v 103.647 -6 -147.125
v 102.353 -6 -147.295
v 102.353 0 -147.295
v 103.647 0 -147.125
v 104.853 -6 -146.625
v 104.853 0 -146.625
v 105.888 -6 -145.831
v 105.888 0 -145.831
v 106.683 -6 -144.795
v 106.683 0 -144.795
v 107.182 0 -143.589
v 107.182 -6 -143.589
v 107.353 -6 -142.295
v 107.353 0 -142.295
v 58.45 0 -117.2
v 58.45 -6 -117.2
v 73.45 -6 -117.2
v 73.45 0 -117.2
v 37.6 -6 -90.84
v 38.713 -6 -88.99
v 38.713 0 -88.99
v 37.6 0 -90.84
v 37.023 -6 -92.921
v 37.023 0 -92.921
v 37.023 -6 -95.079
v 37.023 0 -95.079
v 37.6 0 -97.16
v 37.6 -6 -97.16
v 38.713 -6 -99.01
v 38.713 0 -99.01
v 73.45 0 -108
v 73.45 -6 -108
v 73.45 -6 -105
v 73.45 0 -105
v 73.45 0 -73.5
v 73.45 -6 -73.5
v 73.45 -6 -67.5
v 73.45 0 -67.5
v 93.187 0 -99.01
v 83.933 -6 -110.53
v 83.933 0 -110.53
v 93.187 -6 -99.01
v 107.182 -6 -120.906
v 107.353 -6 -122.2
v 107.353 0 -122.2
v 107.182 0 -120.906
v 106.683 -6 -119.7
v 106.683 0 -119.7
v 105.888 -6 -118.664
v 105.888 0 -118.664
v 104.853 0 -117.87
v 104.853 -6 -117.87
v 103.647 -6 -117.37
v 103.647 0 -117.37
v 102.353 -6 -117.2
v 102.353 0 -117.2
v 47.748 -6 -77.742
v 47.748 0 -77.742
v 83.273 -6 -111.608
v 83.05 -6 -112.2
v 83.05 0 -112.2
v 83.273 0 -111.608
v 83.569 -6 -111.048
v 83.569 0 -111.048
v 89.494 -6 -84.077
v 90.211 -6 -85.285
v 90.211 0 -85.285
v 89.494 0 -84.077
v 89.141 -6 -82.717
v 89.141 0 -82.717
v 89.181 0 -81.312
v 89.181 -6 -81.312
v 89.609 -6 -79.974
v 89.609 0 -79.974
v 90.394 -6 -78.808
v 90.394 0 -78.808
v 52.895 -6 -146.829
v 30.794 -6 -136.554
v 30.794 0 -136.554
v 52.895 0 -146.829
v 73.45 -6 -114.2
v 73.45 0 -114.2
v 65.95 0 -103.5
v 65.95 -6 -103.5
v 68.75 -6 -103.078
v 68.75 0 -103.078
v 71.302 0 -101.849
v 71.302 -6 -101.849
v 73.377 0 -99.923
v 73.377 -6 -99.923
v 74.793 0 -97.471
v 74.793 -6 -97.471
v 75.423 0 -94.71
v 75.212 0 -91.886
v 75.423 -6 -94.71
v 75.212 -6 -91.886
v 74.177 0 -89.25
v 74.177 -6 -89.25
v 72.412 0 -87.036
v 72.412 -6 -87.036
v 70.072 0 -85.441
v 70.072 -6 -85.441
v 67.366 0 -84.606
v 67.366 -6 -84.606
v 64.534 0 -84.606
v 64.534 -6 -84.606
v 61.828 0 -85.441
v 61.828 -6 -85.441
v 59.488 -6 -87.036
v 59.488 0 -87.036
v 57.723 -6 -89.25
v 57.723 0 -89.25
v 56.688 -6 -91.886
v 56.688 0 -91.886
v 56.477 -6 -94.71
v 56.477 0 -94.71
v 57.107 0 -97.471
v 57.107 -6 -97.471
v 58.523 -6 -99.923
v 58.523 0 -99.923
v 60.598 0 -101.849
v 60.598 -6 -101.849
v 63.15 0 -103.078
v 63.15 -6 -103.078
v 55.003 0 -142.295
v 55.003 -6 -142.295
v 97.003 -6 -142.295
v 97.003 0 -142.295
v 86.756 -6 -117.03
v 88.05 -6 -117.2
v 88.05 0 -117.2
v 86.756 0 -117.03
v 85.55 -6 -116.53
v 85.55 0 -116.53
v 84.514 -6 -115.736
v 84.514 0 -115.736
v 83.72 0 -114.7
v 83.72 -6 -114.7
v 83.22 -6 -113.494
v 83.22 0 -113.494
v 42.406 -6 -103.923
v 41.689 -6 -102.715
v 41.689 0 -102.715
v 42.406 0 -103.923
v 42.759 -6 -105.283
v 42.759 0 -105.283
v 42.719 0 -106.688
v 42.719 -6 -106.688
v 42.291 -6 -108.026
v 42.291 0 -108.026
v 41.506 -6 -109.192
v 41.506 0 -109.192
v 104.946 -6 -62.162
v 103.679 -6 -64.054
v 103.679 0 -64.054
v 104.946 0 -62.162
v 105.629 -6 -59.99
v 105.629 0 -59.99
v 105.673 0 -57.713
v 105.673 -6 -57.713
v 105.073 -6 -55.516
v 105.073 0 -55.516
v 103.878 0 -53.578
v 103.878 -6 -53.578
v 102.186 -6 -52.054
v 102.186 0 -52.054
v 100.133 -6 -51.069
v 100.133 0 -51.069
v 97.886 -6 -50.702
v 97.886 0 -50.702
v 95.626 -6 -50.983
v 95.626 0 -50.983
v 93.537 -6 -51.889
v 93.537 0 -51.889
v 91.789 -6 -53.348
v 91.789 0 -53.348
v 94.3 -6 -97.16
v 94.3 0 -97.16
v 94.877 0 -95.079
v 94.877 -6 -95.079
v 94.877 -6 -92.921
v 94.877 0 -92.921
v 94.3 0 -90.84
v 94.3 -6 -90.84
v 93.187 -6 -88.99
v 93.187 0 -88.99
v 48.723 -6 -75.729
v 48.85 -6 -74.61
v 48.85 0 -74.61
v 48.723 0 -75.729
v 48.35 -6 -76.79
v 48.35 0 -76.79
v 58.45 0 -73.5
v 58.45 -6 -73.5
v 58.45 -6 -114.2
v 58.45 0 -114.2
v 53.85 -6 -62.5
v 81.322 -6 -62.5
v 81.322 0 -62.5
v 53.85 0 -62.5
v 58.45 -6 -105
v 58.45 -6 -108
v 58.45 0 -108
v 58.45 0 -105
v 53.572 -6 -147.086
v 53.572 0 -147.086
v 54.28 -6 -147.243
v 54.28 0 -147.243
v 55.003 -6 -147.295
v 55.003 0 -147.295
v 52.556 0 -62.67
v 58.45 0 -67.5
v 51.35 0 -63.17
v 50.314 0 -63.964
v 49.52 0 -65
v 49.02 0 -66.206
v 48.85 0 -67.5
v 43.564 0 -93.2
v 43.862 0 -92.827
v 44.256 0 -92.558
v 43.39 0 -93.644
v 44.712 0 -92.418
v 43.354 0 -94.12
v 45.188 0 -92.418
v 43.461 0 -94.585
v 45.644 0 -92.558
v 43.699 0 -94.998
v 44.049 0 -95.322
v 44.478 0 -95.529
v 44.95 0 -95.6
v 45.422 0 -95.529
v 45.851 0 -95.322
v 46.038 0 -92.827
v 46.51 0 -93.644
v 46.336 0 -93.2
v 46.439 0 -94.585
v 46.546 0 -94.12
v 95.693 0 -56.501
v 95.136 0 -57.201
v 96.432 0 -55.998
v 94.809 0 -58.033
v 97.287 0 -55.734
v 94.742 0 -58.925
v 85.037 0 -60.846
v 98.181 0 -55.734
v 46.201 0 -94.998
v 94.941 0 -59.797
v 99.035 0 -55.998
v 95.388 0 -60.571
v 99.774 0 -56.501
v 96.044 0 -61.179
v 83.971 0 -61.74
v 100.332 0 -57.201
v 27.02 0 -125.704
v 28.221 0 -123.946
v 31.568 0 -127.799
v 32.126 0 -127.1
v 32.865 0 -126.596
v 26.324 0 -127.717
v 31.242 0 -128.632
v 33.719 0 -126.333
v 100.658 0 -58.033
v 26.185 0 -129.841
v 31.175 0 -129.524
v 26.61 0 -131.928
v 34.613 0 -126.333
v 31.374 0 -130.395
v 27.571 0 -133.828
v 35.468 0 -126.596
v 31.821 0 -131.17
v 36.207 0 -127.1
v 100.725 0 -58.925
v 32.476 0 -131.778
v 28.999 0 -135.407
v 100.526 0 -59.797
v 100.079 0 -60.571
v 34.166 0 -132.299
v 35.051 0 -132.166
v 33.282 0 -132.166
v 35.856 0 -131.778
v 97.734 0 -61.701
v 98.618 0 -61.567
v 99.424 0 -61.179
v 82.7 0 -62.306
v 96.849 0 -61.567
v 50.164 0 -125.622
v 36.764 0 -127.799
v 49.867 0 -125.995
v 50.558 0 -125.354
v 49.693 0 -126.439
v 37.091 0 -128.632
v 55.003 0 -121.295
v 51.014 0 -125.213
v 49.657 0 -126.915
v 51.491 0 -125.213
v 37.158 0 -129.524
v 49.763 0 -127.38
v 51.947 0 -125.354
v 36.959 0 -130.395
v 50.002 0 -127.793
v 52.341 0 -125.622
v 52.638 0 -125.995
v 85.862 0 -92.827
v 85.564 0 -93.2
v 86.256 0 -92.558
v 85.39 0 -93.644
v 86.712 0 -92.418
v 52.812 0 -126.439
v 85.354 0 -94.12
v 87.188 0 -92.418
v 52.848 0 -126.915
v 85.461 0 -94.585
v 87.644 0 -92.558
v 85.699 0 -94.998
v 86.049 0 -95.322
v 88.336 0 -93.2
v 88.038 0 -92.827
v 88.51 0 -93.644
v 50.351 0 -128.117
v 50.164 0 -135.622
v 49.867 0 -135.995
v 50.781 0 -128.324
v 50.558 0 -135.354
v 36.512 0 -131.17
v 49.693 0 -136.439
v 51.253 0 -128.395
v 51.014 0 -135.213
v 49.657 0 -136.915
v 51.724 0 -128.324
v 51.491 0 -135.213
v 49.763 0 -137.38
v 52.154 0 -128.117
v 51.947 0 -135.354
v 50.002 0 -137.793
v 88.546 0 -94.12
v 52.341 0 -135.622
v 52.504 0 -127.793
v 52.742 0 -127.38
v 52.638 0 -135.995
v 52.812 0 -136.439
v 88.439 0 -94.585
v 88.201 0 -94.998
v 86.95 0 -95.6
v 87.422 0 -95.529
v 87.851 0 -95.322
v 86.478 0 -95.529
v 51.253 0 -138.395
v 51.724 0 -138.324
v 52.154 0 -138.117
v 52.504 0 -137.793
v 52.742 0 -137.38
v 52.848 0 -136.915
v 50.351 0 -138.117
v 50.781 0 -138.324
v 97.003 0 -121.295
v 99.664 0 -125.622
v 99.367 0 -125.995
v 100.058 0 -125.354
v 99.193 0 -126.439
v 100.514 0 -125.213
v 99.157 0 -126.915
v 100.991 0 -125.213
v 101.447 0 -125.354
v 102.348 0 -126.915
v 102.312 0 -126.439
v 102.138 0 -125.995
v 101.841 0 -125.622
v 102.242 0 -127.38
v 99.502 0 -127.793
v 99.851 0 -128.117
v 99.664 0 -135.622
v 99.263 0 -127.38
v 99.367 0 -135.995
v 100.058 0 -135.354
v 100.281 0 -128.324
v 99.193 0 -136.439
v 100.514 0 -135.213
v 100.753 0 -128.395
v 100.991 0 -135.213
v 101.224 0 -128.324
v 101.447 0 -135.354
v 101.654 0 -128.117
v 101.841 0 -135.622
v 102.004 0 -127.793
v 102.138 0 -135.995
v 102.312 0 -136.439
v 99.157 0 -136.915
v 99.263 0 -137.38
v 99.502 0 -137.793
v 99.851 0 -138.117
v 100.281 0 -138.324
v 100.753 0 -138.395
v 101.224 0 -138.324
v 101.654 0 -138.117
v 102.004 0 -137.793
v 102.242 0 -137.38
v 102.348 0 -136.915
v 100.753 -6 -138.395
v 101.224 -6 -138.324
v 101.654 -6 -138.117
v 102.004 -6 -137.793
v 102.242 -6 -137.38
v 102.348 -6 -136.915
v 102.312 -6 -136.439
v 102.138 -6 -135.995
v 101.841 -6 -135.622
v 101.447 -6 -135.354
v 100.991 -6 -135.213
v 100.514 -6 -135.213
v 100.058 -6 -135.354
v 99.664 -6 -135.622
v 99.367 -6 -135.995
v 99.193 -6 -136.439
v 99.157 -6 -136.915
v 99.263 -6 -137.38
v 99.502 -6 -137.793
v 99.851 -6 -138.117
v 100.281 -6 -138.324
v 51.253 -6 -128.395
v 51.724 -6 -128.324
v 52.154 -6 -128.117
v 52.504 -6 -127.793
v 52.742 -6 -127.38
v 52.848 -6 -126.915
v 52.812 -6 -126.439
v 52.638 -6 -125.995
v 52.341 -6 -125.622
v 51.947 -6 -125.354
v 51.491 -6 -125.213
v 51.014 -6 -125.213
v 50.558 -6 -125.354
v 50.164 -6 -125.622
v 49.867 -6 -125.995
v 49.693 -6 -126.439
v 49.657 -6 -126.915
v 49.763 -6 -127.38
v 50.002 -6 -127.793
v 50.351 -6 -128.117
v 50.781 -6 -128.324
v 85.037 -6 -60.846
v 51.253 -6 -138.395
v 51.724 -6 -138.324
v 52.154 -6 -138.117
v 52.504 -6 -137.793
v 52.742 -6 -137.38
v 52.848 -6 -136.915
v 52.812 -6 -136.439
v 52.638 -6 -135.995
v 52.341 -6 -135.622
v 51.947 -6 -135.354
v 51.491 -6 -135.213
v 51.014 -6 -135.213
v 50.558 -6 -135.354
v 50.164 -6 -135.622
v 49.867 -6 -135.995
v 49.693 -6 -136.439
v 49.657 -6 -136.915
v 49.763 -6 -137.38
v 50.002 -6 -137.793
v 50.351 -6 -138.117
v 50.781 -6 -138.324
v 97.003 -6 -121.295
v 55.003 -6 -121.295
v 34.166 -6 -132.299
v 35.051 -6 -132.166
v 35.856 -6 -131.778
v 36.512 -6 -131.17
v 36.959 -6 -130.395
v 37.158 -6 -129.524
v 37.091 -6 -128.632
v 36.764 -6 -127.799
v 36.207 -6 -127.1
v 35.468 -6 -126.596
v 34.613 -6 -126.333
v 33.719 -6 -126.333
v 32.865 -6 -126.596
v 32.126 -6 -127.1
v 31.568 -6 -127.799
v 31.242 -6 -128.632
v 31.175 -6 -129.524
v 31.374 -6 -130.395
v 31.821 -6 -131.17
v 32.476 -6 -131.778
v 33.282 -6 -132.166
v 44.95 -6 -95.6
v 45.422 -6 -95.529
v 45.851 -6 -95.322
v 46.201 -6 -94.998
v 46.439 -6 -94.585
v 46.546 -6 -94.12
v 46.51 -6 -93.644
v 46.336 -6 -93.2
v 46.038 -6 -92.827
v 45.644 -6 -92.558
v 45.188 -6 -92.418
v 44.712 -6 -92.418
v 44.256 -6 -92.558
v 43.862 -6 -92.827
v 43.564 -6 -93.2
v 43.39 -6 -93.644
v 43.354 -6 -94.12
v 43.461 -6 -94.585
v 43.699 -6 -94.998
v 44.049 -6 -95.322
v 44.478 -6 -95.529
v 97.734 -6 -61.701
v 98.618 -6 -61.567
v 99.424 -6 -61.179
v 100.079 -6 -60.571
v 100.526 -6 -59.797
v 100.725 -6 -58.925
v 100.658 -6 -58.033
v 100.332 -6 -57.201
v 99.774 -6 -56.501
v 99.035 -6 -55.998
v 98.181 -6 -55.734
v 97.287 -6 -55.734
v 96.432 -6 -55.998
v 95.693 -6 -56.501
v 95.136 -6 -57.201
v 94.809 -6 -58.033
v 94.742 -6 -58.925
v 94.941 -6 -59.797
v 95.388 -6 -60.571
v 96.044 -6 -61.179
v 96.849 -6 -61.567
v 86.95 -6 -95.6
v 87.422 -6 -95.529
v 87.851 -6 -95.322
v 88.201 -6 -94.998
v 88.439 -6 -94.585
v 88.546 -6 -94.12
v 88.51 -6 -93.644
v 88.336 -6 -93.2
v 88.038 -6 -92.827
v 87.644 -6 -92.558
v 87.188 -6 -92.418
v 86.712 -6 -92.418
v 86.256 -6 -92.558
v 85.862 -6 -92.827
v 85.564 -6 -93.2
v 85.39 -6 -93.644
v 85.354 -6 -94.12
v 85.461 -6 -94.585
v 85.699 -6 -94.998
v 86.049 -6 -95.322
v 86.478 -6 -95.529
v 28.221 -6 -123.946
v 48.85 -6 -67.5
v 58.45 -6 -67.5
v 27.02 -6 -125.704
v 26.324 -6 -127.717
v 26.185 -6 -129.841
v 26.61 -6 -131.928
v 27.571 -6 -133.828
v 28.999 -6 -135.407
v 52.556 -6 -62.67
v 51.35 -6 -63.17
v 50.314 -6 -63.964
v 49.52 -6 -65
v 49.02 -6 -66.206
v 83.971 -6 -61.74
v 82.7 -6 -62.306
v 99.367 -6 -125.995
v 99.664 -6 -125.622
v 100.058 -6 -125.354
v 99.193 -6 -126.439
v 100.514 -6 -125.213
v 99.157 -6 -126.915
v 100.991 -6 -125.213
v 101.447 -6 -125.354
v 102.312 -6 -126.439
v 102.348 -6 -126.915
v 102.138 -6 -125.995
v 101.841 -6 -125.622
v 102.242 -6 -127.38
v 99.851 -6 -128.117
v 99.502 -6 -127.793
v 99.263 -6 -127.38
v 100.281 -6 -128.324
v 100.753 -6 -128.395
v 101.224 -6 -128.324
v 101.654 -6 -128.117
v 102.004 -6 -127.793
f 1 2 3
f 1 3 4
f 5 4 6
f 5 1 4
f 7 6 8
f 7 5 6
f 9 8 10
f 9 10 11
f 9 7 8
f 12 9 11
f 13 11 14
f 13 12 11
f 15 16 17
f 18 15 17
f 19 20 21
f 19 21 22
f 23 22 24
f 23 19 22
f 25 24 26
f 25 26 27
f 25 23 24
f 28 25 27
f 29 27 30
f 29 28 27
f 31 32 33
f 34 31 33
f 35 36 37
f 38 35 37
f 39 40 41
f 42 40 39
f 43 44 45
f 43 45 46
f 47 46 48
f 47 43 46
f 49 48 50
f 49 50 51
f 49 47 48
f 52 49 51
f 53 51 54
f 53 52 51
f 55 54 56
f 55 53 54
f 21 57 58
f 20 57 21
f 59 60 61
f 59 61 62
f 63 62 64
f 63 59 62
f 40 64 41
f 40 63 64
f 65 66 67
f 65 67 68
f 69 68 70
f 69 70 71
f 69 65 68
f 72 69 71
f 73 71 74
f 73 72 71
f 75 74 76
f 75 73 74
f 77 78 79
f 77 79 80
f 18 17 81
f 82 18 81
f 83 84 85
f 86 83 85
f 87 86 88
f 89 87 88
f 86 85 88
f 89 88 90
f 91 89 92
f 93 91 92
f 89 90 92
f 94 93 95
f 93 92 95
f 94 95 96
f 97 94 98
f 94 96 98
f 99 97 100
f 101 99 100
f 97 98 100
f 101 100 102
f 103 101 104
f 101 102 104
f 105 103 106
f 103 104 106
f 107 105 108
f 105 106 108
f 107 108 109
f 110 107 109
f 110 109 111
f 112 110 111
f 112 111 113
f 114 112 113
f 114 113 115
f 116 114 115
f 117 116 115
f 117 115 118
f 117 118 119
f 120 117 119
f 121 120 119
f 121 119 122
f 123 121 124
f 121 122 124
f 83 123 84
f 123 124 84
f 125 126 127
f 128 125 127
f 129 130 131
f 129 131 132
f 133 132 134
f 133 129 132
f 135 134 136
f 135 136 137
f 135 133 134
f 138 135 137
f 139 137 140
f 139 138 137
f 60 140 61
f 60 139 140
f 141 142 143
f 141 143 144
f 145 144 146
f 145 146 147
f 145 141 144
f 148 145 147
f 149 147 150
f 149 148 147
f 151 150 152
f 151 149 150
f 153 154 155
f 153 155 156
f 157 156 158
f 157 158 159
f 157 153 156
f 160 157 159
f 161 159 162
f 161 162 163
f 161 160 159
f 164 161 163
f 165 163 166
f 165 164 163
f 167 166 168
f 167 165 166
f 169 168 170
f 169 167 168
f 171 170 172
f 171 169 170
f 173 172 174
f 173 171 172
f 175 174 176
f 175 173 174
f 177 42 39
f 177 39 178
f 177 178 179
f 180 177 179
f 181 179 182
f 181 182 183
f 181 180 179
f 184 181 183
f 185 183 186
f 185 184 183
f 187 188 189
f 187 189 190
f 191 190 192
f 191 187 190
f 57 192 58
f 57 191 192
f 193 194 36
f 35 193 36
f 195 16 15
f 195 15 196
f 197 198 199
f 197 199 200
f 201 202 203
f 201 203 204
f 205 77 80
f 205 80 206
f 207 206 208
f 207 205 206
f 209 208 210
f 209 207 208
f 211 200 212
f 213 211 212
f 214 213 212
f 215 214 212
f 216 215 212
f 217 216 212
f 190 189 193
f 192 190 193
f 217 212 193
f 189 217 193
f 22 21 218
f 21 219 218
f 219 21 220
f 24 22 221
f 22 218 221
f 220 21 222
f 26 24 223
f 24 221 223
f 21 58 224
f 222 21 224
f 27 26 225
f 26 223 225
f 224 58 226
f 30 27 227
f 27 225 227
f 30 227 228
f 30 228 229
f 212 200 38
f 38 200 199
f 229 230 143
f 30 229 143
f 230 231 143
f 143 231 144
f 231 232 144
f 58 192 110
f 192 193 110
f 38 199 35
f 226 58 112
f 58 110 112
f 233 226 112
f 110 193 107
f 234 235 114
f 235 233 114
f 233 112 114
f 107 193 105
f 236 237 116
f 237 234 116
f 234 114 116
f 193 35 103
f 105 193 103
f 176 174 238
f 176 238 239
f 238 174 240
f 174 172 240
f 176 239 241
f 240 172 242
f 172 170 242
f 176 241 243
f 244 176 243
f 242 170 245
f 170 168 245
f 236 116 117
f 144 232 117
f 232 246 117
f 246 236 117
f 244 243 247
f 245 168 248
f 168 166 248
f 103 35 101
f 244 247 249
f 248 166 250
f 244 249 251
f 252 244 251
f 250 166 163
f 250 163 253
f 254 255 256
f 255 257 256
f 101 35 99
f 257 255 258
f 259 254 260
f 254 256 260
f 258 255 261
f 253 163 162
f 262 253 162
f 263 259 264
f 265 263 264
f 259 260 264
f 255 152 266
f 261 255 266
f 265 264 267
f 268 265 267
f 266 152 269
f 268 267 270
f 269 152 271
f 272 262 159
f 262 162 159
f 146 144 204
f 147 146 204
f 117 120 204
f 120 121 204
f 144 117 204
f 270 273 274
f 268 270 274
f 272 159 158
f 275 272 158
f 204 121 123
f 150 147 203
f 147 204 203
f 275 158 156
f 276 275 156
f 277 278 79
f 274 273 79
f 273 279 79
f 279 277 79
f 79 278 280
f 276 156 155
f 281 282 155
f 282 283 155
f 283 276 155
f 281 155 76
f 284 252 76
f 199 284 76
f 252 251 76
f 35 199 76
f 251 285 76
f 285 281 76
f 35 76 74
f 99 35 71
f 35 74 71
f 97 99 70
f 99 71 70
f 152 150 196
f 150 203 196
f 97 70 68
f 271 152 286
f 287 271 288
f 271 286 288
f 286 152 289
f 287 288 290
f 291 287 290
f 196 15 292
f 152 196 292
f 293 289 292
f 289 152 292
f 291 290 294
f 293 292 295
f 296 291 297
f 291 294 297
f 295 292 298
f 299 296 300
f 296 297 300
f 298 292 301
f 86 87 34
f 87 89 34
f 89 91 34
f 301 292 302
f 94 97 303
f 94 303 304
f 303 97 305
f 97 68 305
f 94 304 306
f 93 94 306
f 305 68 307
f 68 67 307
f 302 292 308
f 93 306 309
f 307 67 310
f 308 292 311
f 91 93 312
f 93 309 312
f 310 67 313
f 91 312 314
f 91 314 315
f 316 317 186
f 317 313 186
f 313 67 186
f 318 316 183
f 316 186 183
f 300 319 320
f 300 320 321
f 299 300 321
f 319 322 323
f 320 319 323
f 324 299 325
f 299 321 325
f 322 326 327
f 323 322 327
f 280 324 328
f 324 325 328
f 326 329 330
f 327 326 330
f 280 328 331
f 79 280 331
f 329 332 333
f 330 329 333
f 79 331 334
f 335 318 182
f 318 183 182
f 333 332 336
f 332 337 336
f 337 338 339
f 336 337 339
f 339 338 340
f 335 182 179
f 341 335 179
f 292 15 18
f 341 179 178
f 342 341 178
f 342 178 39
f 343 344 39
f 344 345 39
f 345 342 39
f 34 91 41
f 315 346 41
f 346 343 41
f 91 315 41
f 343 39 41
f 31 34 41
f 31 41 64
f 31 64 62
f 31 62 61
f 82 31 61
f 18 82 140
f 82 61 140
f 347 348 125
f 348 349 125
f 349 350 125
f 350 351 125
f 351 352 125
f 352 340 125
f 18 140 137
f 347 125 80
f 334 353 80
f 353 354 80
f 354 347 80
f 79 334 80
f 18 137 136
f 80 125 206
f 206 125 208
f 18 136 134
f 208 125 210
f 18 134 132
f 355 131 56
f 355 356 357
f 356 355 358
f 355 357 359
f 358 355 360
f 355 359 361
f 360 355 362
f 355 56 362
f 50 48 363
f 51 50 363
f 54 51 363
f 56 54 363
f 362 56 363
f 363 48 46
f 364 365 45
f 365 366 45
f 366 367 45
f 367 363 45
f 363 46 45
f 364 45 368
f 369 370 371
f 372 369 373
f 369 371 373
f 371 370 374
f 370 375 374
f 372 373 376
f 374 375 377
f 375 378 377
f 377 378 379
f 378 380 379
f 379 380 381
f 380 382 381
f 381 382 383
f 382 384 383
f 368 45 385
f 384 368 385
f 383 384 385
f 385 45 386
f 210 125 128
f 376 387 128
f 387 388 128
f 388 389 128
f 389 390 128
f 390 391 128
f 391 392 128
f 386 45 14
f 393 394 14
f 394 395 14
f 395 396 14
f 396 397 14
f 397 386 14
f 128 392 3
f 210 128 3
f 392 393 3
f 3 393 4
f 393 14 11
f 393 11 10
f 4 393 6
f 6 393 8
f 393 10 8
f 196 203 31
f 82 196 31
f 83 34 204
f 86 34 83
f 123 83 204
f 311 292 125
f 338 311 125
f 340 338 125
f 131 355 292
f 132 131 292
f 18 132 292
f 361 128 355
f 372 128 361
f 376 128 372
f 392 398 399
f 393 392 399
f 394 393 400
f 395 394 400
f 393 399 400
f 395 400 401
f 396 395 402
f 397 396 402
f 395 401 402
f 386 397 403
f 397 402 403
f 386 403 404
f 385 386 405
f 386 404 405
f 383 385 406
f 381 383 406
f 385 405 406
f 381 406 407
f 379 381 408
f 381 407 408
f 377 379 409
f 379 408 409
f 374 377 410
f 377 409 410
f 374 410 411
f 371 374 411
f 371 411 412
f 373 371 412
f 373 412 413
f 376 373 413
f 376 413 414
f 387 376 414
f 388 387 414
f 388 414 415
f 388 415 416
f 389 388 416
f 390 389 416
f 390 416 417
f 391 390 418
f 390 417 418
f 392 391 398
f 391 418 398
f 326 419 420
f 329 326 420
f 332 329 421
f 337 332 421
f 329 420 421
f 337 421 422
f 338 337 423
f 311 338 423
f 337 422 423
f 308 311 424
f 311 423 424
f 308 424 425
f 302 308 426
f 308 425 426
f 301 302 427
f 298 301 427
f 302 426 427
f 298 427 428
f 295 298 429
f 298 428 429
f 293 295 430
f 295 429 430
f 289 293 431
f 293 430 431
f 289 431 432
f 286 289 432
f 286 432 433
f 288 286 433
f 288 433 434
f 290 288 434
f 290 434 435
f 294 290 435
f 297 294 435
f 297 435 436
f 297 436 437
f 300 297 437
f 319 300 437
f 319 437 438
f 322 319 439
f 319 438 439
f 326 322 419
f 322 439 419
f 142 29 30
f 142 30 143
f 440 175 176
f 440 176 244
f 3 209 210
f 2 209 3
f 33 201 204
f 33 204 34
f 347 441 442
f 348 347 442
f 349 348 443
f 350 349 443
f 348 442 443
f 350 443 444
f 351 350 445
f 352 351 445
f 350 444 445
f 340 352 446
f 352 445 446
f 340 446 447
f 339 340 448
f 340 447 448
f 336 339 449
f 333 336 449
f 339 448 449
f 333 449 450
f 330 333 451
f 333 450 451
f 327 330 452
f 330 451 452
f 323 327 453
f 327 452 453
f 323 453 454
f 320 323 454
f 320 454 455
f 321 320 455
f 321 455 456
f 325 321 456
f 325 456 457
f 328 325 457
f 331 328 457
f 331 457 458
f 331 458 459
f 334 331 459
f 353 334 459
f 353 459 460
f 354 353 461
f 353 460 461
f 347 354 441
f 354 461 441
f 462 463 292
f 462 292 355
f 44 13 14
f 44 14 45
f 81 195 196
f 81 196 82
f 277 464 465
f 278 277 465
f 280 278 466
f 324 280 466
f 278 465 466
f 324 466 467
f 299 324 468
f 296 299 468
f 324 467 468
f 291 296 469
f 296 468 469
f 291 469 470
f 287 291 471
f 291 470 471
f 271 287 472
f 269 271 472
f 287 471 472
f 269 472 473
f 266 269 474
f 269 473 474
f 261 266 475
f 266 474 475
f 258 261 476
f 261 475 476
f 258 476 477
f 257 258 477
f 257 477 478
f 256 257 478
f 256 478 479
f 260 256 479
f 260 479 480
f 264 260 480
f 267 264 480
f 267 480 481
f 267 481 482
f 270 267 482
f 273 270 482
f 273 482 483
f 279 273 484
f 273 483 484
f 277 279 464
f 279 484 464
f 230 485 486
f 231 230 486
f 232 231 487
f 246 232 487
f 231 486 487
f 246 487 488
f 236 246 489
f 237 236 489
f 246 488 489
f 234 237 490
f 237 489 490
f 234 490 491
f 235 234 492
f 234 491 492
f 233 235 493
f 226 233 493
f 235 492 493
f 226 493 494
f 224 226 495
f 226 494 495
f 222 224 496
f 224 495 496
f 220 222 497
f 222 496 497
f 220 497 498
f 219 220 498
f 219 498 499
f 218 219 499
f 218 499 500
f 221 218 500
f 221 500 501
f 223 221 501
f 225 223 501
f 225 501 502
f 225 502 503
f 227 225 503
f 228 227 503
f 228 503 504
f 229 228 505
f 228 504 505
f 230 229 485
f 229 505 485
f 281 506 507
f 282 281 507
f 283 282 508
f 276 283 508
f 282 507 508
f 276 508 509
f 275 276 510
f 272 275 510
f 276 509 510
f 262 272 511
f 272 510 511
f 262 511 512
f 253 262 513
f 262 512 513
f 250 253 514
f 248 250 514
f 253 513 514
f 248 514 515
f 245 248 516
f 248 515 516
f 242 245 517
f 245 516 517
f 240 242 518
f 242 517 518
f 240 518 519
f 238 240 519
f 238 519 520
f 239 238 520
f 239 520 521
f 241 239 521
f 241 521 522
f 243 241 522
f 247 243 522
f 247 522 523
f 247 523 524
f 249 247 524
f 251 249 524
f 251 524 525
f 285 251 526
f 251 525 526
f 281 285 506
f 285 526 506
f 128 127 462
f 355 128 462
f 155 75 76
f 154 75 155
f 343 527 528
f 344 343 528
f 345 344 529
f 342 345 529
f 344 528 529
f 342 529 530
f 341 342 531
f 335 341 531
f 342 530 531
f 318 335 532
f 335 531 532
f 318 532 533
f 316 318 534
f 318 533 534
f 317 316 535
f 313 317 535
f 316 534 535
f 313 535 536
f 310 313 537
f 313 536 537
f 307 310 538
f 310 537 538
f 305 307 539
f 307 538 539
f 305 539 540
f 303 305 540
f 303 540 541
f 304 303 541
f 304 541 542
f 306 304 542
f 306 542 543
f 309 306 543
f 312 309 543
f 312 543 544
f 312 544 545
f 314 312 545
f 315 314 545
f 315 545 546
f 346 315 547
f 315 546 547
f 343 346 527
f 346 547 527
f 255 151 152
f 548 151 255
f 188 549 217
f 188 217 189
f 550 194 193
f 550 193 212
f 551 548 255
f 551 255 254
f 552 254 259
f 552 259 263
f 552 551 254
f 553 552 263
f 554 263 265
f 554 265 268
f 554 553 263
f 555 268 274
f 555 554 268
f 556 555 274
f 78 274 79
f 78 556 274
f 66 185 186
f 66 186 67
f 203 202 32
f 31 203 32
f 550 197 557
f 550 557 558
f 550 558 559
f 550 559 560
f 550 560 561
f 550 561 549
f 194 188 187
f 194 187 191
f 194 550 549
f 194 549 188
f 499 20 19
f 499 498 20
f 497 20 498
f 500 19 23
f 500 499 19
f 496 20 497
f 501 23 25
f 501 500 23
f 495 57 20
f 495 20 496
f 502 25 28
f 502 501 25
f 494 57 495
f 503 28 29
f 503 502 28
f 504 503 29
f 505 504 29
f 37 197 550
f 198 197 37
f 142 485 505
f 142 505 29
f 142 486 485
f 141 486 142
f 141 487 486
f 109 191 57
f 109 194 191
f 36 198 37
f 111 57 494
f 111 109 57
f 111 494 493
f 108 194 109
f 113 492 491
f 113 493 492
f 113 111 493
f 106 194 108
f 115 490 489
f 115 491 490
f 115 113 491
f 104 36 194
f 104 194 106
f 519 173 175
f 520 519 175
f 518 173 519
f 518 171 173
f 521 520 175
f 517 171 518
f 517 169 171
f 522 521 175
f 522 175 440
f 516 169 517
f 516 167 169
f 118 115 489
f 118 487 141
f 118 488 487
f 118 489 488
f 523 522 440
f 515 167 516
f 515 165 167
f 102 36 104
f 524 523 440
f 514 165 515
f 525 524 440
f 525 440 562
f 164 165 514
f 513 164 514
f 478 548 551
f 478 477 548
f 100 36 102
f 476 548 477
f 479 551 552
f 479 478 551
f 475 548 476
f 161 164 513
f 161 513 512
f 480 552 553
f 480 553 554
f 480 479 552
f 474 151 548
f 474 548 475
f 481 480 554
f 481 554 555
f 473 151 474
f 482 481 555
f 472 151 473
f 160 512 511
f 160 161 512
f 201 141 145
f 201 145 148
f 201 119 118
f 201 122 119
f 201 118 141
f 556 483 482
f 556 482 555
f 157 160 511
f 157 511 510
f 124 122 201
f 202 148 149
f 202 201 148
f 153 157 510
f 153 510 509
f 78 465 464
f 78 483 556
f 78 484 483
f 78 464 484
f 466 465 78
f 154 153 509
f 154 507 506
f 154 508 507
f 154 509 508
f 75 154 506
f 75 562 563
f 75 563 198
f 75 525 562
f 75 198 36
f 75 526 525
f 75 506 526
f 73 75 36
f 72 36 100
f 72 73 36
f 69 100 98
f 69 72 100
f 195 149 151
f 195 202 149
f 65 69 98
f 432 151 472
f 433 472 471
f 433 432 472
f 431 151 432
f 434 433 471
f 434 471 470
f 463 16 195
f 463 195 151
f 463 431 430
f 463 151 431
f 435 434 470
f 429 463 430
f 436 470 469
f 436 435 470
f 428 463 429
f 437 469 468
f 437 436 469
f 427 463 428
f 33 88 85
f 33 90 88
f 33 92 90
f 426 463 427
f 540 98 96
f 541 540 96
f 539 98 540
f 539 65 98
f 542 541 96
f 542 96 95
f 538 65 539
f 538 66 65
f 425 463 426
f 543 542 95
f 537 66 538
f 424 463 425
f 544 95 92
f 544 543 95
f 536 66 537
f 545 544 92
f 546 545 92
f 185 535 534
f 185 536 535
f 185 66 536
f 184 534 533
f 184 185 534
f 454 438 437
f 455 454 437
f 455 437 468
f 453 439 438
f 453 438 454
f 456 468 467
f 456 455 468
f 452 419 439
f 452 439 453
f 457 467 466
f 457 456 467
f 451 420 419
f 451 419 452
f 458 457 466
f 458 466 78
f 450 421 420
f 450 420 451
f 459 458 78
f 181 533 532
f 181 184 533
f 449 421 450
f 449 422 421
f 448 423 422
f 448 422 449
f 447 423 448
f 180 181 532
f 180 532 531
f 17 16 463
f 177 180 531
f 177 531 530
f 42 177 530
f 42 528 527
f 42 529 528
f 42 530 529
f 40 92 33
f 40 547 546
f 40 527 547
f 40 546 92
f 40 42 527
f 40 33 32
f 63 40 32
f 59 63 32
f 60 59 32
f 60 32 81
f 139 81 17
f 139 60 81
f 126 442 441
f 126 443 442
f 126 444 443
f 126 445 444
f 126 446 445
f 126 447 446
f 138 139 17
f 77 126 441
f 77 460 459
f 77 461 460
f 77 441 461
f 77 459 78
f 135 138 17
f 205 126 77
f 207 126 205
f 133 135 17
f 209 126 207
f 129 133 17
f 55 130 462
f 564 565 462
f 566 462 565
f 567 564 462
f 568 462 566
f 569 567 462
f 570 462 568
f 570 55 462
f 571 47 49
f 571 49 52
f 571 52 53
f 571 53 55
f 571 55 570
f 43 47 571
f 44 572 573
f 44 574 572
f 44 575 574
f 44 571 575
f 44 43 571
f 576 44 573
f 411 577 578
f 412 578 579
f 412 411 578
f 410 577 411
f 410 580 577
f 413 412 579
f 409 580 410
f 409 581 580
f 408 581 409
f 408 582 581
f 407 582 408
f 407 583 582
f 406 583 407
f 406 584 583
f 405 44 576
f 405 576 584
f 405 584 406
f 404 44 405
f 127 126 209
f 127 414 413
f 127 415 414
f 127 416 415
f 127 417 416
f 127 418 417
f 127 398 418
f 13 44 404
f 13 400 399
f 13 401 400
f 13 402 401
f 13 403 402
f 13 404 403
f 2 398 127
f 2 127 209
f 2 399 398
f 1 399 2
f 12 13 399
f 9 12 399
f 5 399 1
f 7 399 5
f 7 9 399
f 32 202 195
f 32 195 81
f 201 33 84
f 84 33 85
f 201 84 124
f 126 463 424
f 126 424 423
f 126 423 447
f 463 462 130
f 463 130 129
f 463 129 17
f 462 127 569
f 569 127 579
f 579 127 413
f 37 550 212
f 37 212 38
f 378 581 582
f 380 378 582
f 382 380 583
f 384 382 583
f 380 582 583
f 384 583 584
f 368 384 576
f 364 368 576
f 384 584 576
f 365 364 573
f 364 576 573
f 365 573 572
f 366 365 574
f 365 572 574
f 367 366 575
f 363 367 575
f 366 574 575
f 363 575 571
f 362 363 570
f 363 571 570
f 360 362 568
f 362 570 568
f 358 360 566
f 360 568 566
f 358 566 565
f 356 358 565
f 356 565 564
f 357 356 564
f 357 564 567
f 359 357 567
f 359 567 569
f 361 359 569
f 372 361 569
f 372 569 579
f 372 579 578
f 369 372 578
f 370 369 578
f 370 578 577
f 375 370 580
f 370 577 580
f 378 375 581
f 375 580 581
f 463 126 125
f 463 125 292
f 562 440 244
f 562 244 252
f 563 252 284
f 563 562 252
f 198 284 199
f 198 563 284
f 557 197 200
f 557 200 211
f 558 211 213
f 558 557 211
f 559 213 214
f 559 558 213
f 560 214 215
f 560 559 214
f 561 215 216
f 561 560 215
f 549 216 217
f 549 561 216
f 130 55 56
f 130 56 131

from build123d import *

# Parameters (mm, degrees)
ESBO_O1_R                = 3
ESBO_O1_R_2              = 1.6
ESBO_O1_W                = 15
ESBO_O1_H                = 3
ESBO_O1_W_2              = 42
ESBO_O1_H_2              = 21
ESBO_O1_R_3              = 9.5
ESBO_O1_H_3              = 6
RESSALTO_EXTRUS_O1_DEPTH = 6
FILETE1_R                = 5


with BuildPart() as part:
    # Esboço1 → Ressalto-extrusão1 (new body)
    with BuildSketch(Plane.XZ.offset(6)):
        with BuildLine():
            ThreePointArc((28.221137594, -123.946334359), (26.32780231, -130.898758331), (30.793557575, -136.55366306))
            Line((30.793557575, -136.55366306), (52.89462836, -146.829127406))
            ThreePointArc((52.89462836, -146.829127406), (53.923154275, -147.177291613), (55.00259, -147.2952))
            Line((55.00259, -147.2952), (102.35259, -147.2952))
            ThreePointArc((102.35259, -147.2952), (105.888123906, -145.830733906), (107.35259, -142.2952))
            Line((107.35259, -142.2952), (107.35259, -122.2))
            ThreePointArc((107.35259, -122.2), (105.888123906, -118.664466094), (102.35259, -117.2))
            Line((102.35259, -117.2), (88.05, -117.2))
            ThreePointArc((88.05, -117.2), (84.514466094, -115.735533906), (83.05, -112.2))
            Line((83.05, -112.2), (83.05, -111.6301581))
            Line((83.05, -111.6301581), (93.187089706, -99.009861475))
            ThreePointArc((93.187089706, -99.009861475), (94.95, -94), (93.187089706, -88.990138525))
            Line((93.187089706, -88.990138525), (87.547626436, -81.969218188))
            Line((87.547626436, -81.969218188), (103.678862406, -64.053665641))
            ThreePointArc((103.678862406, -64.053665641), (103.086748653, -52.755462186), (91.788545198, -53.347575939))
            Line((91.788545198, -53.347575939), (85.037246259, -60.845653032))
            ThreePointArc((85.037246259, -60.845653032), (83.355205347, -62.067727288), (81.321522132, -62.5))
            Line((81.321522132, -62.5), (53.85, -62.5))
            ThreePointArc((53.85, -62.5), (50.314466094, -63.964466094), (48.85, -67.5))
            Line((48.85, -67.5), (48.85, -76.3698419))
            Line((48.85, -76.3698419), (38.712910294, -88.990138525))
            ThreePointArc((38.712910294, -88.990138525), (36.95, -94), (38.712910294, -99.009861475))
            Line((38.712910294, -99.009861475), (44.352373564, -106.030781812))
            Line((44.352373564, -106.030781812), (28.221137594, -123.946334359))
        make_face()
        with Locations(Location((34.166296198, -129.29937921, 0), (0, 0, 270))):
            Circle(ESBO_O1_R, mode=Mode.SUBTRACT)
        with Locations(Location((51.25259, -136.7952, 0), (0, 0, 270))):
            Circle(ESBO_O1_R_2, mode=Mode.SUBTRACT)
        with Locations(Location((51.25259, -126.7952, 0), (0, 0, 270))):
            Circle(ESBO_O1_R_2, mode=Mode.SUBTRACT)
        with Locations((65.95, -115.7)):
            Rectangle(ESBO_O1_W, ESBO_O1_H, mode=Mode.SUBTRACT)
        with Locations((65.95, -106.5)):
            Rectangle(ESBO_O1_W, ESBO_O1_H, mode=Mode.SUBTRACT)
        with Locations((76.00259, -131.7952)):
            Rectangle(ESBO_O1_W_2, ESBO_O1_H_2, mode=Mode.SUBTRACT)
        with Locations(Location((100.75259, -136.7952, 0), (0, 0, 270))):
            Circle(ESBO_O1_R_2, mode=Mode.SUBTRACT)
        with Locations(Location((100.75259, -126.7952, 0), (0, 0, 270))):
            Circle(ESBO_O1_R_2, mode=Mode.SUBTRACT)
        with Locations(Location((65.95, -94, 0), (0, 0, 270))):
            Circle(ESBO_O1_R_3, mode=Mode.SUBTRACT)
        with Locations((65.95, -70.5)):
            Rectangle(ESBO_O1_W, ESBO_O1_H_3, mode=Mode.SUBTRACT)
        with Locations(Location((97.733703802, -58.70062079, 0), (0, 0, 270))):
            Circle(ESBO_O1_R, mode=Mode.SUBTRACT)
        with Locations(Location((44.95, -94, 0), (0, 0, 270))):
            Circle(ESBO_O1_R_2, mode=Mode.SUBTRACT)
        with Locations(Location((86.95, -94, 0), (0, 0, 270))):
            Circle(ESBO_O1_R_2, mode=Mode.SUBTRACT)
    extrude(amount=-RESSALTO_EXTRUS_O1_DEPTH)

    # Filete1
    # the kernel refuses this fillet: 5 mm, written as the material it adds along each edge
    with BuildSketch(Plane(origin=(83.05, -6, -111.6301581), x_dir=(0, 0, -1), z_dir=(0, 1, 0))) as filete1_piece_1:
        with BuildLine():
            CenterArc((2.031271709, -4.78165483), FILETE1_R, 106.994862895, 21.777857611)
            Line((-1.099891712, -0.883473763), (-1.162514981, -0.805510142))
            Line((-1.162514981, -0.805510142), (-0.062623268, 0.077963621))
            Line((-0.062623268, 0.077963621), (0, 0.1))
            ThreePointArc((0, 0.1), (0.28492095, 0.1), (0.540613304, 0.095633097))
            Line((0.540613304, 0.095633097), (0.5698419, 0))
        make_face()
    extrude(amount=6)
    with BuildSketch(Plane(origin=(87.547626436, -6, -81.969218188), x_dir=(0.626232684317403, 0, -0.7796362133024736), z_dir=(0, 1, 0)), Plane(origin=(44.352373564, -6, -106.030781812), x_dir=(-0.6262326843177314, 0, 0.7796362133022096), z_dir=(0, 1, 0))) as filete1_piece_2:
        with BuildLine():
            CenterArc((FILETE1_R * 0.85065630428, -FILETE1_R), FILETE1_R, 90, 80.772720506)
            Line((-FILETE1_R * 0.136403726762, -FILETE1_R * 0.839648838109), (-FILETE1_R * 0.156144927382, -FILETE1_R * 0.836441814871))
            Line((-FILETE1_R * 0.156144927382, -FILETE1_R * 0.836441814871), (-FILETE1_R * 0.0170131260856, FILETE1_R * 0.02))
            Line((-FILETE1_R * 0.0170131260856, FILETE1_R * 0.02), (FILETE1_R * 0.85065630428, FILETE1_R * 0.02))
            Line((FILETE1_R * 0.85065630428, FILETE1_R * 0.02), (FILETE1_R * 0.85065630428, 0))
        make_face()
    extrude(amount=6)
    with BuildSketch(Plane(origin=(48.85, -6, -76.3698419), x_dir=(0, 0, 1), z_dir=(0, 1, 0))) as filete1_piece_3:
        with BuildLine():
            CenterArc((FILETE1_R * 0.351888031743, -FILETE1_R), FILETE1_R, 90, 38.772720506)
            Line((-FILETE1_R * 0.274344652575, -FILETE1_R * 0.220363786698), (-FILETE1_R * 0.286869306261, -FILETE1_R * 0.204771062432))
            Line((-FILETE1_R * 0.286869306261, -FILETE1_R * 0.204771062432), (-FILETE1_R * 0.00703776063486, FILETE1_R * 0.02))
            Line((-FILETE1_R * 0.00703776063486, FILETE1_R * 0.02), (FILETE1_R * 0.351888031743, FILETE1_R * 0.02))
            Line((FILETE1_R * 0.351888031743, FILETE1_R * 0.02), (FILETE1_R * 0.351888031743, 0))
        make_face()
    extrude(amount=6)


solid = part.part
